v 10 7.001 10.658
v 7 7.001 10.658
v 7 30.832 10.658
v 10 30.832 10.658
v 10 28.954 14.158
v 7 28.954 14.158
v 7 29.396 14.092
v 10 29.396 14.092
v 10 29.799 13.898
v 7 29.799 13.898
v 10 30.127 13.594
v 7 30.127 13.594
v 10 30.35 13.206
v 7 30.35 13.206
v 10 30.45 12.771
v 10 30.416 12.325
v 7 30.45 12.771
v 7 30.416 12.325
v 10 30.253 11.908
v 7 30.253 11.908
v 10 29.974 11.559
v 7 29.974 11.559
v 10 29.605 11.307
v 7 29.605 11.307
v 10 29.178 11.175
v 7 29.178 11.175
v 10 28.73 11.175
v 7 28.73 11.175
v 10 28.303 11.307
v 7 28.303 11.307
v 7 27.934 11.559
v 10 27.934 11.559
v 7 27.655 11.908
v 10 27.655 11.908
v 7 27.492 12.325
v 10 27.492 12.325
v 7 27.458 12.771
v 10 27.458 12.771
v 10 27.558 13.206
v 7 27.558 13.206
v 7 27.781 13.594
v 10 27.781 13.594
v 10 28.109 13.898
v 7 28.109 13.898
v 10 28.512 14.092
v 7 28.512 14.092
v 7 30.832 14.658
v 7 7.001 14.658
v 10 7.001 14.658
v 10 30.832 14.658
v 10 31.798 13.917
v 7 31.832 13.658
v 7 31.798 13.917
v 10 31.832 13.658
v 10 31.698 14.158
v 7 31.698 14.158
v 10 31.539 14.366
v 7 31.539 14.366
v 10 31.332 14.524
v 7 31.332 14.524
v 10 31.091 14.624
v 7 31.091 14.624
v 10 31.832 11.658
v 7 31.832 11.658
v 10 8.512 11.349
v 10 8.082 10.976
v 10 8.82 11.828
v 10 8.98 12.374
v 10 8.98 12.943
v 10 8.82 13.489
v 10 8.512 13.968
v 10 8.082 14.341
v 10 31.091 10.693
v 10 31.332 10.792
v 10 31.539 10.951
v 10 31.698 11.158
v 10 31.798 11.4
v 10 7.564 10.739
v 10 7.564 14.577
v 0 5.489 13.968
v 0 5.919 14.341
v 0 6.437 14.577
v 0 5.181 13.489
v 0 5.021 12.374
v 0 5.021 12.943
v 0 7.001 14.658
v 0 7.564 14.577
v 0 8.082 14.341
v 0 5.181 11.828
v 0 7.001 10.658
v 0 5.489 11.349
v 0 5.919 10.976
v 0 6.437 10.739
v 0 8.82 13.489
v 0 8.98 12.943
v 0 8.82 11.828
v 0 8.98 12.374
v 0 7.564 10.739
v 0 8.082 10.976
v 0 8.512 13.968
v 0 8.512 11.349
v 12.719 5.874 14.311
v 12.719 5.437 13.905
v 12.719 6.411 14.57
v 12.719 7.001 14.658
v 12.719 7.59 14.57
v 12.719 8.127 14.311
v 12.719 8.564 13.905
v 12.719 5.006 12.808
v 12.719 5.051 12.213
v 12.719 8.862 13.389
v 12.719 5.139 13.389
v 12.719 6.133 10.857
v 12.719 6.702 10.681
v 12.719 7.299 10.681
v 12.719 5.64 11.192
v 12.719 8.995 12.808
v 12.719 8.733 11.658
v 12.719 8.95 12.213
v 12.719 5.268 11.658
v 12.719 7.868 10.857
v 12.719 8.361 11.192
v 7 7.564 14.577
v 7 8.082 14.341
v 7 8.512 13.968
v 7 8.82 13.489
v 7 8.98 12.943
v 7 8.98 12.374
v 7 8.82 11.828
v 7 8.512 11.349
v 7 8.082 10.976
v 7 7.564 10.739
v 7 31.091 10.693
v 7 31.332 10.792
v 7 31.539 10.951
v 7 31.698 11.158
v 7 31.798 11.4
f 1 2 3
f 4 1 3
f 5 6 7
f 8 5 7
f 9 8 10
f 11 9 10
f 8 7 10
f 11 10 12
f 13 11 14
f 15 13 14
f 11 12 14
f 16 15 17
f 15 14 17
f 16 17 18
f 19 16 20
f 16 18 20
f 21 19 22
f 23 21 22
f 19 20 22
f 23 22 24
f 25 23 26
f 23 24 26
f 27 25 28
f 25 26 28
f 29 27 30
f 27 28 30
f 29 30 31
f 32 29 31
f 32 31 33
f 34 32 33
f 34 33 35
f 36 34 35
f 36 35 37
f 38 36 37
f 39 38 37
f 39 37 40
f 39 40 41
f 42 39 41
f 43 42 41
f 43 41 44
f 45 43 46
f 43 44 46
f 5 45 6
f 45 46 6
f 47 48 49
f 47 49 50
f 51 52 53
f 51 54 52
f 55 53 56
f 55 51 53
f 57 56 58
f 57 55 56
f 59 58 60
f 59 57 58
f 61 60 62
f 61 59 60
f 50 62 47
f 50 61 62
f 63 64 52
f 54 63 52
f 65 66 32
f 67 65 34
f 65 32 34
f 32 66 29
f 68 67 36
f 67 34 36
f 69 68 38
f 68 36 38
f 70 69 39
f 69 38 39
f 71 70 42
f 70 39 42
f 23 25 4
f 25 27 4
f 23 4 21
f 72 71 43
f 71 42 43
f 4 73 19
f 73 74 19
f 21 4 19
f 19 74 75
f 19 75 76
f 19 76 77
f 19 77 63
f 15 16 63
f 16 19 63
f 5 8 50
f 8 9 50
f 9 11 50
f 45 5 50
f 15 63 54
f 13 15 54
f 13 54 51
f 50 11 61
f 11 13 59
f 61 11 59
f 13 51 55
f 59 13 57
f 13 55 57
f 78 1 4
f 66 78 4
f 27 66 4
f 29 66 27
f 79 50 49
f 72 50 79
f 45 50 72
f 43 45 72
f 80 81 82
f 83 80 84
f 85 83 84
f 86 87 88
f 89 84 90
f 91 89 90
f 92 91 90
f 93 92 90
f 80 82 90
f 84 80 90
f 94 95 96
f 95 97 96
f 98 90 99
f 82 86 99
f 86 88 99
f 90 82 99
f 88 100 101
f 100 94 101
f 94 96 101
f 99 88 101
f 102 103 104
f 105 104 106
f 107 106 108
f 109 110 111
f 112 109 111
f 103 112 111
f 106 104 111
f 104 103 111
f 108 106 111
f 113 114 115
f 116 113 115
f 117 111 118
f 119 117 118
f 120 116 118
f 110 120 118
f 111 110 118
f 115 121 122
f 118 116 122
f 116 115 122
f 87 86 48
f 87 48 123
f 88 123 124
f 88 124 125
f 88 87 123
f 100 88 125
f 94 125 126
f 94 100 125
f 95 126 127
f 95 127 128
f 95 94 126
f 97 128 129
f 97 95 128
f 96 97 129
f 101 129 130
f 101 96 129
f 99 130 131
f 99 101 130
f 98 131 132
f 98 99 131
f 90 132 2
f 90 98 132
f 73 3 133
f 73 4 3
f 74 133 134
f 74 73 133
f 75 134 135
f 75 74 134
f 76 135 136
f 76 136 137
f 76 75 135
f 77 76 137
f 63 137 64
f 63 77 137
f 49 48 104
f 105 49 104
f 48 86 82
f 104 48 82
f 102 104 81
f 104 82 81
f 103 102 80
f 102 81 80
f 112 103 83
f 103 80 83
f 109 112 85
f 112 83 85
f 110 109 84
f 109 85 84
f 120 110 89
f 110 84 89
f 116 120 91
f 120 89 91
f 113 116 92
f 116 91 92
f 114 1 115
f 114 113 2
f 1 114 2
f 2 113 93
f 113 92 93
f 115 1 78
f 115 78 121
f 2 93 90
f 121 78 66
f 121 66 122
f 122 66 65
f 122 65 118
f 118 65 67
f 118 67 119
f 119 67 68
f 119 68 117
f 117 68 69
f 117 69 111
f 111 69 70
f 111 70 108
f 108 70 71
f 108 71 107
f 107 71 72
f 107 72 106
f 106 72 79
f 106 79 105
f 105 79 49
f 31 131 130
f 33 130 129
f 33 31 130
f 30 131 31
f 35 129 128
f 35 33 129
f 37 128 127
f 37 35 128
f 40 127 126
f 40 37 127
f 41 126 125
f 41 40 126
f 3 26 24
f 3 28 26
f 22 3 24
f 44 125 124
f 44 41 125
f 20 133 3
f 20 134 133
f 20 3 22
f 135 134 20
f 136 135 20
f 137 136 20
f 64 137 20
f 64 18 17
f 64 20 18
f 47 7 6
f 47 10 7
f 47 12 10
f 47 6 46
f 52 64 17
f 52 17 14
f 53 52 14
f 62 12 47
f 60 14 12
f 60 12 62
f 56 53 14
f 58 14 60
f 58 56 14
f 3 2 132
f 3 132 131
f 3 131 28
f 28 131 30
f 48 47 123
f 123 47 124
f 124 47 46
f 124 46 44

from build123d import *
from build123d.topology import SkipClean

# Parameters (mm, degrees)
SKETCH1_R           = 2
BOSS_EXTRUDE1_DEPTH = 42
BOSS_EXTRUDE2_DEPTH = 10
CUT_EXTRUDE1_DEPTH  = 7
BOSS_EXTRUDE4_DEPTH = 3
SKETCH5_R           = 1.5
CUT_EXTRUDE3_DEPTH  = 54.708670792
SKETCH6_W           = 11.822480184
SKETCH6_H           = 12.15707868
CUT_EXTRUDE5_DEPTH  = 54.708670792
FILLET4_R           = 1
FILLET5_R           = 1
SKETCH7_W           = 34.513514199
SKETCH7_H           = 14.72292105
CUT_EXTRUDE6_DEPTH  = 50.84257119
SKETCH8_W           = 4
SKETCH8_H           = 12.808527321
SKETCH8_R           = 1.5
BOSS_EXTRUDE5_DEPTH = 3
FILLET6_R           = 1


with BuildPart() as part:
    # Sketch1 → Boss-Extrude1 (new body)
    with BuildSketch(Plane(origin=(0, 0, 0), x_dir=(0, 0, -1), z_dir=(1, 0, 0))):
        with Locations(Location((-12.6584653, 7.000514901, 0), (0, 0, 180))):
            Circle(SKETCH1_R)
    extrude(amount=BOSS_EXTRUDE1_DEPTH)

    # Sketch2 → Boss-Extrude2 (add)
    with BuildSketch(Plane.ZY):
        with BuildLine():
            Line((10.6584653, 7.000514901), (10.6584653, 13.760469307))
            ThreePointArc((10.6584653, 13.760469307), (12.6584653, 15.760469307), (14.6584653, 13.760469307))
            Line((14.6584653, 13.760469307), (14.6584653, 7.000514901))
            ThreePointArc((14.6584653, 7.000514901), (12.6584653, 5.000514901), (10.6584653, 7.000514901))
        make_face()
    extrude(amount=-BOSS_EXTRUDE2_DEPTH)

    # Sketch3 → Cut-Extrude1 (cut)
    with SkipClean():  # the faces are left unmerged after this step: merging them gives an invalid solid
        with BuildSketch(Plane.ZY):
            with BuildLine():
                Line((10.6584653, 7.000514901), (10.6584653, 13.760469307))
                ThreePointArc((10.6584653, 13.760469307), (12.6584653, 15.760469307), (14.6584653, 13.760469307))
                Line((14.6584653, 13.760469307), (14.6584653, 7.000514901))
                ThreePointArc((14.6584653, 7.000514901), (12.6584653, 9.000514901), (10.6584653, 7.000514901))
            make_face()
        extrude(amount=-CUT_EXTRUDE1_DEPTH, mode=Mode.SUBTRACT)

    # Sketch4 → Boss-Extrude4 (add)
    with SkipClean():  # the faces are left unmerged after this step: merging them gives an invalid solid
        with BuildSketch(Plane.ZY.offset(-7)):
            with BuildLine():
                Line((10.6584653, 36.009876522), (10.6584653, 13.760469307))
                ThreePointArc((10.6584653, 13.760469307), (12.6584653, 15.760469307), (14.6584653, 13.760469307))
                Line((14.6584653, 13.760469307), (14.6584653, 36.009876522))
                Line((14.6584653, 36.009876522), (10.6584653, 36.009876522))
            make_face()
            with BuildLine():
                ThreePointArc((10.6584653, 36.009876522), (12.6584653, 38.009876522), (14.6584653, 36.009876522))
                Line((14.6584653, 36.009876522), (10.6584653, 36.009876522))
            make_face()
        extrude(amount=-BOSS_EXTRUDE4_DEPTH)

    # Sketch5 → Cut-Extrude3 (cut, through all)
    with SkipClean():  # the faces are left unmerged after this step: merging them gives an invalid solid
        with BuildSketch(Plane.ZY.offset(-7)):
            with Locations((12.706639089, 22.91954594)):
                Circle(SKETCH5_R)
        extrude(amount=-CUT_EXTRUDE3_DEPTH, mode=Mode.SUBTRACT)

    # Sketch6 → Cut-Extrude5 (cut, through all)
    with SkipClean():  # the faces are left unmerged after this step: merging them gives an invalid solid
        with BuildSketch(Plane.ZY.offset(-7)):
            with Locations((12.630555797, 32.616849438)):
                Rectangle(SKETCH6_W, SKETCH6_H)
        extrude(amount=-CUT_EXTRUDE5_DEPTH, mode=Mode.SUBTRACT)

    # Fillet4
    fillet4_edges = [part.edges().sort_by_distance(p)[0] for p in [
        (8.5, 26.538310098, 14.6584653),
    ]]
    fillet(fillet4_edges, radius=FILLET4_R)

    # Fillet5
    fillet5_edges = [part.edges().sort_by_distance(p)[0] for p in [
        (8.5, 26.538310098, 10.6584653),
    ]]
    fillet(fillet5_edges, radius=FILLET5_R)

    # Sketch7 → Cut-Extrude6 (cut, through all)
    with BuildSketch(Plane(origin=(0, 0, 10.6584653), x_dir=(-1, 0, 0), z_dir=(0, 0, -1))):
        with Locations((-29.975495684, 6.364049631)):
            Rectangle(SKETCH7_W, SKETCH7_H)
    extrude(amount=-CUT_EXTRUDE6_DEPTH, mode=Mode.SUBTRACT)

    # Sketch8 → Boss-Extrude5 (add)
    with SkipClean():  # the faces are left unmerged after this step: merging them gives an invalid solid
        with BuildSketch(Plane.ZY.offset(-7)):
            with Locations((12.6584653, 25.427627083)):
                Rectangle(SKETCH8_W, SKETCH8_H)
            with Locations((12.6584653, 28.953962247)):
                Circle(SKETCH8_R, mode=Mode.SUBTRACT)
        extrude(amount=-BOSS_EXTRUDE5_DEPTH)

    # Fillet6
    fillet6_edges = [part.edges().sort_by_distance(p)[0] for p in [
        (8.5, 31.831890743, 14.6584653),
        (8.5, 31.831890743, 10.6584653),
    ]]
    fillet(fillet6_edges, radius=FILLET6_R)


solid = part.part
